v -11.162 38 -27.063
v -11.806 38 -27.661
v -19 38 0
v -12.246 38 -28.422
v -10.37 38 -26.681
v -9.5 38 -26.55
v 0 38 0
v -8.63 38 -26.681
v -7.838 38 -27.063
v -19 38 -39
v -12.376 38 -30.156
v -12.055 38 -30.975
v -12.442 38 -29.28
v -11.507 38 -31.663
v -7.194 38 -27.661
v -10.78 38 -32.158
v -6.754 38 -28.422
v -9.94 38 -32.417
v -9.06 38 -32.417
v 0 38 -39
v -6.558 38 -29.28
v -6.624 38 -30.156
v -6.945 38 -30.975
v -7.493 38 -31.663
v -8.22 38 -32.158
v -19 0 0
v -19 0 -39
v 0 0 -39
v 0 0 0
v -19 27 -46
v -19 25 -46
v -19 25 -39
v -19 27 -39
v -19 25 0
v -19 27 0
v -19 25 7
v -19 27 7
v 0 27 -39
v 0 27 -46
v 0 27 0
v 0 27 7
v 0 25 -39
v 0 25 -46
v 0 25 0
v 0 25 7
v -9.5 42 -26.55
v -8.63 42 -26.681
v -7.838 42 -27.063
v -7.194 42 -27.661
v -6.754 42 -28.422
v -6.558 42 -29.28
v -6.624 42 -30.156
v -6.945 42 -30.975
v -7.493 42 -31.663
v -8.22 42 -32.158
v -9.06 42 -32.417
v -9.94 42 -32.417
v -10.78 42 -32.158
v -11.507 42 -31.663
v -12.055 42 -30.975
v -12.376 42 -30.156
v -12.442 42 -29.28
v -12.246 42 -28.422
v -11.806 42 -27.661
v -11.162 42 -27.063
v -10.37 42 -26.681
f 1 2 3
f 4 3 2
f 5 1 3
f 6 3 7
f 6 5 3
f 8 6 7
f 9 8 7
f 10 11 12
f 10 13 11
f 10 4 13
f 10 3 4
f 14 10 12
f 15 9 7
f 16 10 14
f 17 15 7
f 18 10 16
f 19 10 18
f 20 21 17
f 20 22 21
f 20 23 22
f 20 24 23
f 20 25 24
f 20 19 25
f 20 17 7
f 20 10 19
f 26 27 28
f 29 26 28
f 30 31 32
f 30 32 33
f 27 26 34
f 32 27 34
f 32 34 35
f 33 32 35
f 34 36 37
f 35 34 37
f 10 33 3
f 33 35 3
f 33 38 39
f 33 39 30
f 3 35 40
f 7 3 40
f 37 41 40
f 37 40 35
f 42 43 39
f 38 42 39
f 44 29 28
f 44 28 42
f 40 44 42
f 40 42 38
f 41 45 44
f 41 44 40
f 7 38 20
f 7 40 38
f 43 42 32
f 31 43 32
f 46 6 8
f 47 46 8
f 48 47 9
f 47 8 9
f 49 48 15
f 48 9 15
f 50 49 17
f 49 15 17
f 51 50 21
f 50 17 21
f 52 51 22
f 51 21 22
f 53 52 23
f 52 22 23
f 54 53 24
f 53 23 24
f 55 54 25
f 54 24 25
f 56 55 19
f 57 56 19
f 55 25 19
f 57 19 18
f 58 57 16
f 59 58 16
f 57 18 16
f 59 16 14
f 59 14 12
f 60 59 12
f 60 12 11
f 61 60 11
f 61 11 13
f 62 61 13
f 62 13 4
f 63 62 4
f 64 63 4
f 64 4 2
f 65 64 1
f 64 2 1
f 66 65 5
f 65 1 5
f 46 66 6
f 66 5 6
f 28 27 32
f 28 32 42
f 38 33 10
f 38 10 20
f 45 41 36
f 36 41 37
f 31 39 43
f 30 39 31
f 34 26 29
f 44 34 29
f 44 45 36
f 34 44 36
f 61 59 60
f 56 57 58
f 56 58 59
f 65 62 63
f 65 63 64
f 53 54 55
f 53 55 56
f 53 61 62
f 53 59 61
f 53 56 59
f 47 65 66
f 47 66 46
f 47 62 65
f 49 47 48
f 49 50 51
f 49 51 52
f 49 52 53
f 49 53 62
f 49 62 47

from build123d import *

# Parameters (mm, degrees)
ESQUISSE1_W             = 19
ESQUISSE1_H             = 39
BOSS_EXTRU_1_DEPTH      = 38
BOSS_EXTRU_2_DEPTH      = 7
BOSS_EXTRU_2_DEPTH_BACK = 46
ESQUISSE2_W             = 19
ESQUISSE2_H             = 2
ESQUISSE3_R             = 2.95
BOSS_EXTRU_3_DEPTH      = 4


with BuildPart() as part:
    # Esquisse1 → Boss.-Extru.1 (new body)
    with BuildSketch(Plane(origin=(0, 0, 0), x_dir=(1, 0, 0), z_dir=(0, 1, 0))):
        with Locations((-9.5, 19.5)):
            Rectangle(ESQUISSE1_W, ESQUISSE1_H)
    extrude(amount=BOSS_EXTRU_1_DEPTH)

    # Esquisse2 → Boss.-Extru.2 (add, two sides: drawn at the far end of the back side and taken through both)
    with BuildSketch(Plane(origin=(0, 0, -39), x_dir=(-1, 0, 0), z_dir=(0, 0, -1)).offset(-BOSS_EXTRU_2_DEPTH_BACK)):
        with Locations((9.5, 26)):
            Rectangle(ESQUISSE2_W, ESQUISSE2_H)
    extrude(amount=BOSS_EXTRU_2_DEPTH + BOSS_EXTRU_2_DEPTH_BACK)

    # Esquisse3 → Boss.-Extru.3 (add)
    with BuildSketch(Plane(origin=(0, 38, 0), x_dir=(1, 0, 0), z_dir=(0, 1, 0))):
        with Locations(Location((-9.5, 29.5, 0), (0, 0, 270))):
            Circle(ESQUISSE3_R)
    extrude(amount=BOSS_EXTRU_3_DEPTH)


solid = part.part
